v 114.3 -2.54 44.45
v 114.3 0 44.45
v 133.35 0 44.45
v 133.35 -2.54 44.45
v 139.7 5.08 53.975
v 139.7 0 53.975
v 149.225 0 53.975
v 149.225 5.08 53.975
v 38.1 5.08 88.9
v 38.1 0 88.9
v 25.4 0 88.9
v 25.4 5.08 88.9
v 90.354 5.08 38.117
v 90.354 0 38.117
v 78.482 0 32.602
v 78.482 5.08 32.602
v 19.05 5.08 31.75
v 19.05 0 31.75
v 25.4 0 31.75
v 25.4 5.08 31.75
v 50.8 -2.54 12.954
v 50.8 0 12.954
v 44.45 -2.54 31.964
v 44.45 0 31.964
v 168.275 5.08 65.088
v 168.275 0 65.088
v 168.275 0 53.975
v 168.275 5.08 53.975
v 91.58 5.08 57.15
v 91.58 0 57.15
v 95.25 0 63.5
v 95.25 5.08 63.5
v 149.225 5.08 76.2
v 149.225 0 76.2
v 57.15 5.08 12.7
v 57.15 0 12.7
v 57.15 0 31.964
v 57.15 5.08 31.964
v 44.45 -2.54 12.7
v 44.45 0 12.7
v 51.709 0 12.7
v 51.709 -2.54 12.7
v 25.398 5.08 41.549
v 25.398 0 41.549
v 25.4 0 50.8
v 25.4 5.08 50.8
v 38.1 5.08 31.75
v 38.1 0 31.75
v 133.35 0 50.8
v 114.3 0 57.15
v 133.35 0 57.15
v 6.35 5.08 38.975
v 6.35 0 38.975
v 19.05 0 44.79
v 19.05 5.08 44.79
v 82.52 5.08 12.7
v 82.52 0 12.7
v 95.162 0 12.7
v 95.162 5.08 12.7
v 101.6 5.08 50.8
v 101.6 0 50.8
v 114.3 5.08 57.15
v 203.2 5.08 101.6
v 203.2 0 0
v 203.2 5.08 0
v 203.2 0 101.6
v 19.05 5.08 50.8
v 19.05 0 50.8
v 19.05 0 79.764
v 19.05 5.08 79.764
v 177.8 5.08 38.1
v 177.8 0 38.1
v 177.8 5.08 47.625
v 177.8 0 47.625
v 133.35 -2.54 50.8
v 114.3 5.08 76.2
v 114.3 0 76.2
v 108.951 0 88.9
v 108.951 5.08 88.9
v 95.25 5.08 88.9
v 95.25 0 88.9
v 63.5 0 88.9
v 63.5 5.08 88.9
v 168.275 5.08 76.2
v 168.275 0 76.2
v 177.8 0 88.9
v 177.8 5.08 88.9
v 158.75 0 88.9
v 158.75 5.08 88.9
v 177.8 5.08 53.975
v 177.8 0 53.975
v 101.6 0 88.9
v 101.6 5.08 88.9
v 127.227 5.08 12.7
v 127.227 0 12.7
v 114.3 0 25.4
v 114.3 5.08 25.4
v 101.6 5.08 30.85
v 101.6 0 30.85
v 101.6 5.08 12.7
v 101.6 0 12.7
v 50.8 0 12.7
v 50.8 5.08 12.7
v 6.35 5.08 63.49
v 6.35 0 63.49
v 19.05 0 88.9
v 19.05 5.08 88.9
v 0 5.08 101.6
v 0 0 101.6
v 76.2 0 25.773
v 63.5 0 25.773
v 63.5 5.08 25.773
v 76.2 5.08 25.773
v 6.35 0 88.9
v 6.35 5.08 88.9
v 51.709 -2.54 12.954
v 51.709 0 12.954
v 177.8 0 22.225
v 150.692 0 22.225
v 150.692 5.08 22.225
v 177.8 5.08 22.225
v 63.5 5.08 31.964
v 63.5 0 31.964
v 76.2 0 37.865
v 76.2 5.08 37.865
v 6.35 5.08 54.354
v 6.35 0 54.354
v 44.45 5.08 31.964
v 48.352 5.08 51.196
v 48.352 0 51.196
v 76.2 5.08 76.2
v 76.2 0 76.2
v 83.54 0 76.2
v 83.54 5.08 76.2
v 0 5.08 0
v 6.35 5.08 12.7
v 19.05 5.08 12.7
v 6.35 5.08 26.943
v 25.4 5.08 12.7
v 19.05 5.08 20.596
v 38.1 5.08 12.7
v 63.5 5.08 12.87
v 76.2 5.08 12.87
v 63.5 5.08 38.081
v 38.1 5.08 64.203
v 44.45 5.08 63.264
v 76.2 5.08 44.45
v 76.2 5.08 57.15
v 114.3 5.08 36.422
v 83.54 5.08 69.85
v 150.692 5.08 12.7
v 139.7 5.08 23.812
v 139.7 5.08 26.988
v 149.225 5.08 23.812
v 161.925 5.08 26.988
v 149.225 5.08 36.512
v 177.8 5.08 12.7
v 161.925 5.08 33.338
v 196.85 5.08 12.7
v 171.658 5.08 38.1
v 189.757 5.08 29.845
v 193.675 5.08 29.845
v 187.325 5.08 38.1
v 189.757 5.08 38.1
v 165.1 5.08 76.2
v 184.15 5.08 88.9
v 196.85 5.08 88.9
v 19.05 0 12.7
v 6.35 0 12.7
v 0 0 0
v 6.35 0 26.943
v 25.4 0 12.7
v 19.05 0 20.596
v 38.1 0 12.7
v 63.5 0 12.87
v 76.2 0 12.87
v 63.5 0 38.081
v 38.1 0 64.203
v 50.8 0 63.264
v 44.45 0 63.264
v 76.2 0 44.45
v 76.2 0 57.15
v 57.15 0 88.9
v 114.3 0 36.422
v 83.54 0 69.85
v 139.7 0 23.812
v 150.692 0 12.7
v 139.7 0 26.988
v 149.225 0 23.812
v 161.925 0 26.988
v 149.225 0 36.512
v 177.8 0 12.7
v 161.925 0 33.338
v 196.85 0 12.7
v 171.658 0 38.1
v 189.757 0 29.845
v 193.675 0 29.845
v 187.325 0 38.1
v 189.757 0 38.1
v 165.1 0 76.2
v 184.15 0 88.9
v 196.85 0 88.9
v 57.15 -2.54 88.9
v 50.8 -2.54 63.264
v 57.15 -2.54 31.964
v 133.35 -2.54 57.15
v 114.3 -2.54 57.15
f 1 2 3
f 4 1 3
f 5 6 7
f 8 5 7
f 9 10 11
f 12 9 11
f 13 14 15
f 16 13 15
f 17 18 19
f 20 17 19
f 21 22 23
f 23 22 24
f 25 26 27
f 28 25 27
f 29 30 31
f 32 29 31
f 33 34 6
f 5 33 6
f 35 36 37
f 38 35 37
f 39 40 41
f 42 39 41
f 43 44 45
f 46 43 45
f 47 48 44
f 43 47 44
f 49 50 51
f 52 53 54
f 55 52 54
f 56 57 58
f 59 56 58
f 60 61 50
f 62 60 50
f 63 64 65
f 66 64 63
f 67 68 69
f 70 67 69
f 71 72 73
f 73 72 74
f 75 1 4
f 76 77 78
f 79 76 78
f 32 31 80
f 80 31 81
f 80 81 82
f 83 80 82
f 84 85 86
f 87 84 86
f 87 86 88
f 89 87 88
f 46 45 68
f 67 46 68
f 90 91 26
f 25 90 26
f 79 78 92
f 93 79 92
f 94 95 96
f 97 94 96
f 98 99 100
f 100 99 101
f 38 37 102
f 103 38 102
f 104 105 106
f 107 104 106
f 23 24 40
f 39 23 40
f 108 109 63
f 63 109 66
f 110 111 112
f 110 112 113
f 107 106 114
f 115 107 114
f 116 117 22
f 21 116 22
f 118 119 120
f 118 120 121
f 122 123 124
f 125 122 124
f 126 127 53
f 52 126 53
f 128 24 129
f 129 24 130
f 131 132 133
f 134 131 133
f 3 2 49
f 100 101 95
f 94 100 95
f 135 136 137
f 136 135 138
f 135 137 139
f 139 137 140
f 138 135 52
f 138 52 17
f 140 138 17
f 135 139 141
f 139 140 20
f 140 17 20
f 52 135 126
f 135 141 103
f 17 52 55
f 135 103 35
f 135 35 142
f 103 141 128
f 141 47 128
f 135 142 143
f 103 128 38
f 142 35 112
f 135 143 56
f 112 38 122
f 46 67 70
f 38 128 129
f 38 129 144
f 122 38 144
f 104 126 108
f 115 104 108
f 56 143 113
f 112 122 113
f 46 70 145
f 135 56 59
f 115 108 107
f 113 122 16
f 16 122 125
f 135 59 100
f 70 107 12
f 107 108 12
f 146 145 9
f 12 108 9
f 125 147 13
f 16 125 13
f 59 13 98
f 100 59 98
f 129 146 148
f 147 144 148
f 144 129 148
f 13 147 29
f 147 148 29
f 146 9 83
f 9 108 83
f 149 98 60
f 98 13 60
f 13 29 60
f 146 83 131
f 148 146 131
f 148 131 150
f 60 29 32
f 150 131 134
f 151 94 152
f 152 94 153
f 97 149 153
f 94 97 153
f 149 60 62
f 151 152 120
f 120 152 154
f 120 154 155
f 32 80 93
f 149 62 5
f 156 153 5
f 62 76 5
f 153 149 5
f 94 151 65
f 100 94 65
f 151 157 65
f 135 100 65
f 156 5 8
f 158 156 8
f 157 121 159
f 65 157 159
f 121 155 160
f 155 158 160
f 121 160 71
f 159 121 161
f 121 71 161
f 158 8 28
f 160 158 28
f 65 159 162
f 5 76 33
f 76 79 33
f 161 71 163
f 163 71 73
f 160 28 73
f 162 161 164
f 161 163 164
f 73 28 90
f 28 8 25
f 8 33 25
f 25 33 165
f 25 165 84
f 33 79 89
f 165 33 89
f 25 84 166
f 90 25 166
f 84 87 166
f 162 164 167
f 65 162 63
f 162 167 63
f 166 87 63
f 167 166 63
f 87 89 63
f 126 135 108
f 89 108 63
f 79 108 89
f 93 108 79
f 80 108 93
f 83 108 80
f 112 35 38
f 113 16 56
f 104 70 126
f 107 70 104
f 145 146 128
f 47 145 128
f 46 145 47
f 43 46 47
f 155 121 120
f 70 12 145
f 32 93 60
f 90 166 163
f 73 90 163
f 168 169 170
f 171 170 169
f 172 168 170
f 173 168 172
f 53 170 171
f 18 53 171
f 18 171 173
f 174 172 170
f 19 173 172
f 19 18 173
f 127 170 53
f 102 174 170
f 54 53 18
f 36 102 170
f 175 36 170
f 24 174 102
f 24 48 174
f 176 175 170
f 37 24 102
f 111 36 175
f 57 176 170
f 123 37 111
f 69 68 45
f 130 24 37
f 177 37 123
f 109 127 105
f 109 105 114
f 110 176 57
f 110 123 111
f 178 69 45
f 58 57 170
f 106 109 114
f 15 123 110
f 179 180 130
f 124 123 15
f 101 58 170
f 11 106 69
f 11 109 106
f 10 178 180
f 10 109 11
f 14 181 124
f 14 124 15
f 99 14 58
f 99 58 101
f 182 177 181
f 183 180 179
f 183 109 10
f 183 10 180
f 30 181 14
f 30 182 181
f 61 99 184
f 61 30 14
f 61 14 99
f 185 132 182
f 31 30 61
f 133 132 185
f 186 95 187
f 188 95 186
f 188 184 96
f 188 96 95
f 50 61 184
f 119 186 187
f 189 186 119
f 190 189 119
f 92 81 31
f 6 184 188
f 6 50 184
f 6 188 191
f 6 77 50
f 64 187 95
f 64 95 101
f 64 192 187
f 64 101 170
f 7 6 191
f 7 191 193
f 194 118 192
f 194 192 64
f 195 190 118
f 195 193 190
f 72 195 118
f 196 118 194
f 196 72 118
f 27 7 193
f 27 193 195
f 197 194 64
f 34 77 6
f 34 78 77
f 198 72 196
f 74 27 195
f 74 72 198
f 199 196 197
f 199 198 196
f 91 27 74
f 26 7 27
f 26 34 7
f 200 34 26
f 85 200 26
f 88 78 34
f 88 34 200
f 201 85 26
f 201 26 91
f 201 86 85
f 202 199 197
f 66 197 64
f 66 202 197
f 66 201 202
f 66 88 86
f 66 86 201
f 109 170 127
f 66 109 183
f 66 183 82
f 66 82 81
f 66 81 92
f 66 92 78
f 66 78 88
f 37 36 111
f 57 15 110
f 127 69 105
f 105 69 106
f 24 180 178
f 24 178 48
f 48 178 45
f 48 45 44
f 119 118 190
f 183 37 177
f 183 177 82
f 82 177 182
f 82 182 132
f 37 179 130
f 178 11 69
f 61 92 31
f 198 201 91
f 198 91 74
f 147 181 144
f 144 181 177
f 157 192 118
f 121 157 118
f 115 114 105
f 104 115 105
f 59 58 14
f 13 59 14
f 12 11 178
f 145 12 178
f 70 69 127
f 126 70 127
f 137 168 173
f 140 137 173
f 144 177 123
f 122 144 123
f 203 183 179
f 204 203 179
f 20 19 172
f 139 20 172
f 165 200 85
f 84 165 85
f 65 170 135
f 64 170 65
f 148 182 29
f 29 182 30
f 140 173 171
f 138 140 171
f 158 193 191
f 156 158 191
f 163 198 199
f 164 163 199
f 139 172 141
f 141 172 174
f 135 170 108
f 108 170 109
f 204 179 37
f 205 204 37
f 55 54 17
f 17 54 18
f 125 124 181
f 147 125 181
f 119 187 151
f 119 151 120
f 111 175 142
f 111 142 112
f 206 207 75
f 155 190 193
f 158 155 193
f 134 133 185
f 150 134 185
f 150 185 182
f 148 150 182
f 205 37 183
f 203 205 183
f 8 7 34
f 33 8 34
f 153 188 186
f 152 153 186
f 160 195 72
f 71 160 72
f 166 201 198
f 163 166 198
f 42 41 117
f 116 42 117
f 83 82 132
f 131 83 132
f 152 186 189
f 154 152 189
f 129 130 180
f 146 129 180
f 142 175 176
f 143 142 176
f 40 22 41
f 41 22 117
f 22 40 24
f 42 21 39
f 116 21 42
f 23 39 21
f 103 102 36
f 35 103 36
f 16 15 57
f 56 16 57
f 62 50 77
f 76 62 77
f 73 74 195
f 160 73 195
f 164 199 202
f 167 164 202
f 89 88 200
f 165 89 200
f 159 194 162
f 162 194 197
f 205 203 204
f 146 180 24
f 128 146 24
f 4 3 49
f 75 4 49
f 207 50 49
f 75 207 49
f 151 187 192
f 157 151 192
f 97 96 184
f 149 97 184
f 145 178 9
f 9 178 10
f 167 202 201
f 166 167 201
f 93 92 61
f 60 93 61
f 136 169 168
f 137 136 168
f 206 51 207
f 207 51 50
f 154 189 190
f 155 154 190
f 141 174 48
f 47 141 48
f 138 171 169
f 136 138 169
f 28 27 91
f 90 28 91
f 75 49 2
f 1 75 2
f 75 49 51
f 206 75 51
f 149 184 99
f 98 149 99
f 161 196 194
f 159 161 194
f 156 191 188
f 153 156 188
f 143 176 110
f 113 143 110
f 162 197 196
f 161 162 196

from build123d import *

# Parameters (mm, degrees)
F1_W     = 203.2
F1_H     = 101.6
F2_DEPTH = 5.08
F4_W     = 12.7
F4_H     = 12.9032718343
F4_W_2   = 27.1084083955
F4_H_2   = 9.525
F6_DEPTH = 6.35
F7_DEPTH = 6.35
F8_DEPTH = 2.54


with BuildPart() as f2:
    # F1 (on Front) → F2 (new body)
    with BuildSketch(Plane.XZ):
        with Locations((101.6, 50.8)):
            Rectangle(F1_W, F1_H)
    extrude(amount=-F2_DEPTH)

    # F4 (on face) → F6 (cut)
    with BuildSketch(Plane.XZ):
        Polygon((6.35, 88.9), (6.35, 63.4896950778), (19.05, 88.9), align=None)
        Polygon((38.1, 88.9), (25.4, 88.9), (38.1, 64.2026114812), align=None)
        Polygon((19.05, 79.7638625923), (6.35, 54.3535576701), (6.35, 38.9748217106), (19.05, 44.7899766155), (19.05, 31.75), (25.4, 31.75), (25.4, 12.7), (38.1, 12.7), (38.1, 31.75), (25.3980111729, 41.5485496718), (25.4, 50.8), (19.05, 50.8), align=None)
        Polygon((19.05, 20.5959144004), (6.35, 26.9433392146), (6.35, 12.7), (19.05, 12.7), align=None)
        Polygon((48.3517487947, 51.1962487751), (44.45, 63.2637151304), (44.45, 31.964471331), align=None)
        Polygon((57.15, 12.7), (57.15, 31.964471331), (50.8, 12.7), align=None)
        with Locations((69.85, 19.3217204115)):
            Rectangle(F4_W, F4_H)
        Polygon((90.3535660462, 38.1168511729), (78.4824932634, 32.6018280187), (82.5201821204, 12.7), (95.1624735994, 12.7), align=None)
        Polygon((76.2, 44.45), (63.5, 38.0811007293), (63.5, 31.964471331), (76.2, 37.8645947099), align=None)
        Polygon((95.25, 88.9), (63.5, 88.9), (76.2, 76.2), (83.5397814848, 76.2), (83.5397814848, 69.85), (76.2, 57.15), (91.5801092576, 57.15), (95.25, 63.5), align=None)
        Polygon((101.6, 50.8), (114.3, 57.15), (114.3, 76.2), (108.9507660084, 88.9), (101.6, 88.9), align=None)
        Polygon((114.3, 36.4221383274), (101.6, 30.8501303583), (101.6, 12.7), (127.2270479083, 12.7), (114.3, 25.4), align=None)
        Polygon((149.225, 53.975), (149.225, 76.2), (139.7, 53.975), align=None)
        Polygon((177.8, 88.9), (158.75, 88.9), (165.1, 76.2), (168.275, 76.2), align=None)
        Polygon((149.225, 36.5125), (139.7, 26.9875), (139.7, 23.8125), (149.225, 23.8125), (161.925, 26.9875), (161.925, 33.3375), align=None)
        with Locations((164.2457958023, 17.4625)):
            Rectangle(F4_W_2, F4_H_2)
    extrude(amount=-F6_DEPTH, mode=Mode.SUBTRACT)

    # F4 (on face) + F5 (on face) → F7 (cut)
    with BuildSketch(Plane.XZ):
        Polygon((187.325, 88.9), (187.325, 38.1), (189.7574476064, 38.1), (196.85, 88.9), align=None)
        Polygon((193.675, 29.845), (189.7574476064, 29.845), (196.85, 12.7), align=None)
        Polygon((177.8, 38.1), (177.8, 47.625), (171.658446914, 38.1), align=None)
    with BuildSketch(Plane.XZ):
        Polygon((177.8, 53.975), (168.275, 65.0875), (168.275, 53.975), align=None)
        Polygon((196.85, 88.9), (184.15, 88.9), (187.325, 38.1), (189.7574476064, 38.1), align=None)
    extrude(amount=-F7_DEPTH, mode=Mode.SUBTRACT)

    # F5 (on face) → F8 (join)
    with BuildSketch(Plane.XZ):
        Polygon((57.15, 88.9), (50.8, 63.2637151304), (57.15, 31.964471331), align=None)
    extrude(amount=F8_DEPTH)


with BuildPart() as f8:
    # F5 (on face) → F8, piece 2 (new body)
    with BuildSketch(Plane.XZ):
        Polygon((44.45, 31.964471331), (44.45, 12.7), (50.8, 12.7), (51.7085269504, 12.7), (51.7085269504, 12.954), (50.8, 12.954), align=None)
    extrude(amount=F8_DEPTH)


with BuildPart() as f8b:
    # F5 (on face) → F8, piece 3 (new body)
    with BuildSketch(Plane.XZ):
        Polygon((133.35, 57.15), (114.3, 57.15), (133.35, 50.8), align=None)
    extrude(amount=F8_DEPTH)


with BuildPart() as f8c:
    # F5 (on face) → F8, piece 4 (new body)
    with BuildSketch(Plane.XZ):
        Polygon((133.35, 44.45), (133.35, 50.8), (114.3, 44.45), align=None)
    extrude(amount=F8_DEPTH)


solid = Compound([f2.part, f8.part, f8b.part, f8c.part])
